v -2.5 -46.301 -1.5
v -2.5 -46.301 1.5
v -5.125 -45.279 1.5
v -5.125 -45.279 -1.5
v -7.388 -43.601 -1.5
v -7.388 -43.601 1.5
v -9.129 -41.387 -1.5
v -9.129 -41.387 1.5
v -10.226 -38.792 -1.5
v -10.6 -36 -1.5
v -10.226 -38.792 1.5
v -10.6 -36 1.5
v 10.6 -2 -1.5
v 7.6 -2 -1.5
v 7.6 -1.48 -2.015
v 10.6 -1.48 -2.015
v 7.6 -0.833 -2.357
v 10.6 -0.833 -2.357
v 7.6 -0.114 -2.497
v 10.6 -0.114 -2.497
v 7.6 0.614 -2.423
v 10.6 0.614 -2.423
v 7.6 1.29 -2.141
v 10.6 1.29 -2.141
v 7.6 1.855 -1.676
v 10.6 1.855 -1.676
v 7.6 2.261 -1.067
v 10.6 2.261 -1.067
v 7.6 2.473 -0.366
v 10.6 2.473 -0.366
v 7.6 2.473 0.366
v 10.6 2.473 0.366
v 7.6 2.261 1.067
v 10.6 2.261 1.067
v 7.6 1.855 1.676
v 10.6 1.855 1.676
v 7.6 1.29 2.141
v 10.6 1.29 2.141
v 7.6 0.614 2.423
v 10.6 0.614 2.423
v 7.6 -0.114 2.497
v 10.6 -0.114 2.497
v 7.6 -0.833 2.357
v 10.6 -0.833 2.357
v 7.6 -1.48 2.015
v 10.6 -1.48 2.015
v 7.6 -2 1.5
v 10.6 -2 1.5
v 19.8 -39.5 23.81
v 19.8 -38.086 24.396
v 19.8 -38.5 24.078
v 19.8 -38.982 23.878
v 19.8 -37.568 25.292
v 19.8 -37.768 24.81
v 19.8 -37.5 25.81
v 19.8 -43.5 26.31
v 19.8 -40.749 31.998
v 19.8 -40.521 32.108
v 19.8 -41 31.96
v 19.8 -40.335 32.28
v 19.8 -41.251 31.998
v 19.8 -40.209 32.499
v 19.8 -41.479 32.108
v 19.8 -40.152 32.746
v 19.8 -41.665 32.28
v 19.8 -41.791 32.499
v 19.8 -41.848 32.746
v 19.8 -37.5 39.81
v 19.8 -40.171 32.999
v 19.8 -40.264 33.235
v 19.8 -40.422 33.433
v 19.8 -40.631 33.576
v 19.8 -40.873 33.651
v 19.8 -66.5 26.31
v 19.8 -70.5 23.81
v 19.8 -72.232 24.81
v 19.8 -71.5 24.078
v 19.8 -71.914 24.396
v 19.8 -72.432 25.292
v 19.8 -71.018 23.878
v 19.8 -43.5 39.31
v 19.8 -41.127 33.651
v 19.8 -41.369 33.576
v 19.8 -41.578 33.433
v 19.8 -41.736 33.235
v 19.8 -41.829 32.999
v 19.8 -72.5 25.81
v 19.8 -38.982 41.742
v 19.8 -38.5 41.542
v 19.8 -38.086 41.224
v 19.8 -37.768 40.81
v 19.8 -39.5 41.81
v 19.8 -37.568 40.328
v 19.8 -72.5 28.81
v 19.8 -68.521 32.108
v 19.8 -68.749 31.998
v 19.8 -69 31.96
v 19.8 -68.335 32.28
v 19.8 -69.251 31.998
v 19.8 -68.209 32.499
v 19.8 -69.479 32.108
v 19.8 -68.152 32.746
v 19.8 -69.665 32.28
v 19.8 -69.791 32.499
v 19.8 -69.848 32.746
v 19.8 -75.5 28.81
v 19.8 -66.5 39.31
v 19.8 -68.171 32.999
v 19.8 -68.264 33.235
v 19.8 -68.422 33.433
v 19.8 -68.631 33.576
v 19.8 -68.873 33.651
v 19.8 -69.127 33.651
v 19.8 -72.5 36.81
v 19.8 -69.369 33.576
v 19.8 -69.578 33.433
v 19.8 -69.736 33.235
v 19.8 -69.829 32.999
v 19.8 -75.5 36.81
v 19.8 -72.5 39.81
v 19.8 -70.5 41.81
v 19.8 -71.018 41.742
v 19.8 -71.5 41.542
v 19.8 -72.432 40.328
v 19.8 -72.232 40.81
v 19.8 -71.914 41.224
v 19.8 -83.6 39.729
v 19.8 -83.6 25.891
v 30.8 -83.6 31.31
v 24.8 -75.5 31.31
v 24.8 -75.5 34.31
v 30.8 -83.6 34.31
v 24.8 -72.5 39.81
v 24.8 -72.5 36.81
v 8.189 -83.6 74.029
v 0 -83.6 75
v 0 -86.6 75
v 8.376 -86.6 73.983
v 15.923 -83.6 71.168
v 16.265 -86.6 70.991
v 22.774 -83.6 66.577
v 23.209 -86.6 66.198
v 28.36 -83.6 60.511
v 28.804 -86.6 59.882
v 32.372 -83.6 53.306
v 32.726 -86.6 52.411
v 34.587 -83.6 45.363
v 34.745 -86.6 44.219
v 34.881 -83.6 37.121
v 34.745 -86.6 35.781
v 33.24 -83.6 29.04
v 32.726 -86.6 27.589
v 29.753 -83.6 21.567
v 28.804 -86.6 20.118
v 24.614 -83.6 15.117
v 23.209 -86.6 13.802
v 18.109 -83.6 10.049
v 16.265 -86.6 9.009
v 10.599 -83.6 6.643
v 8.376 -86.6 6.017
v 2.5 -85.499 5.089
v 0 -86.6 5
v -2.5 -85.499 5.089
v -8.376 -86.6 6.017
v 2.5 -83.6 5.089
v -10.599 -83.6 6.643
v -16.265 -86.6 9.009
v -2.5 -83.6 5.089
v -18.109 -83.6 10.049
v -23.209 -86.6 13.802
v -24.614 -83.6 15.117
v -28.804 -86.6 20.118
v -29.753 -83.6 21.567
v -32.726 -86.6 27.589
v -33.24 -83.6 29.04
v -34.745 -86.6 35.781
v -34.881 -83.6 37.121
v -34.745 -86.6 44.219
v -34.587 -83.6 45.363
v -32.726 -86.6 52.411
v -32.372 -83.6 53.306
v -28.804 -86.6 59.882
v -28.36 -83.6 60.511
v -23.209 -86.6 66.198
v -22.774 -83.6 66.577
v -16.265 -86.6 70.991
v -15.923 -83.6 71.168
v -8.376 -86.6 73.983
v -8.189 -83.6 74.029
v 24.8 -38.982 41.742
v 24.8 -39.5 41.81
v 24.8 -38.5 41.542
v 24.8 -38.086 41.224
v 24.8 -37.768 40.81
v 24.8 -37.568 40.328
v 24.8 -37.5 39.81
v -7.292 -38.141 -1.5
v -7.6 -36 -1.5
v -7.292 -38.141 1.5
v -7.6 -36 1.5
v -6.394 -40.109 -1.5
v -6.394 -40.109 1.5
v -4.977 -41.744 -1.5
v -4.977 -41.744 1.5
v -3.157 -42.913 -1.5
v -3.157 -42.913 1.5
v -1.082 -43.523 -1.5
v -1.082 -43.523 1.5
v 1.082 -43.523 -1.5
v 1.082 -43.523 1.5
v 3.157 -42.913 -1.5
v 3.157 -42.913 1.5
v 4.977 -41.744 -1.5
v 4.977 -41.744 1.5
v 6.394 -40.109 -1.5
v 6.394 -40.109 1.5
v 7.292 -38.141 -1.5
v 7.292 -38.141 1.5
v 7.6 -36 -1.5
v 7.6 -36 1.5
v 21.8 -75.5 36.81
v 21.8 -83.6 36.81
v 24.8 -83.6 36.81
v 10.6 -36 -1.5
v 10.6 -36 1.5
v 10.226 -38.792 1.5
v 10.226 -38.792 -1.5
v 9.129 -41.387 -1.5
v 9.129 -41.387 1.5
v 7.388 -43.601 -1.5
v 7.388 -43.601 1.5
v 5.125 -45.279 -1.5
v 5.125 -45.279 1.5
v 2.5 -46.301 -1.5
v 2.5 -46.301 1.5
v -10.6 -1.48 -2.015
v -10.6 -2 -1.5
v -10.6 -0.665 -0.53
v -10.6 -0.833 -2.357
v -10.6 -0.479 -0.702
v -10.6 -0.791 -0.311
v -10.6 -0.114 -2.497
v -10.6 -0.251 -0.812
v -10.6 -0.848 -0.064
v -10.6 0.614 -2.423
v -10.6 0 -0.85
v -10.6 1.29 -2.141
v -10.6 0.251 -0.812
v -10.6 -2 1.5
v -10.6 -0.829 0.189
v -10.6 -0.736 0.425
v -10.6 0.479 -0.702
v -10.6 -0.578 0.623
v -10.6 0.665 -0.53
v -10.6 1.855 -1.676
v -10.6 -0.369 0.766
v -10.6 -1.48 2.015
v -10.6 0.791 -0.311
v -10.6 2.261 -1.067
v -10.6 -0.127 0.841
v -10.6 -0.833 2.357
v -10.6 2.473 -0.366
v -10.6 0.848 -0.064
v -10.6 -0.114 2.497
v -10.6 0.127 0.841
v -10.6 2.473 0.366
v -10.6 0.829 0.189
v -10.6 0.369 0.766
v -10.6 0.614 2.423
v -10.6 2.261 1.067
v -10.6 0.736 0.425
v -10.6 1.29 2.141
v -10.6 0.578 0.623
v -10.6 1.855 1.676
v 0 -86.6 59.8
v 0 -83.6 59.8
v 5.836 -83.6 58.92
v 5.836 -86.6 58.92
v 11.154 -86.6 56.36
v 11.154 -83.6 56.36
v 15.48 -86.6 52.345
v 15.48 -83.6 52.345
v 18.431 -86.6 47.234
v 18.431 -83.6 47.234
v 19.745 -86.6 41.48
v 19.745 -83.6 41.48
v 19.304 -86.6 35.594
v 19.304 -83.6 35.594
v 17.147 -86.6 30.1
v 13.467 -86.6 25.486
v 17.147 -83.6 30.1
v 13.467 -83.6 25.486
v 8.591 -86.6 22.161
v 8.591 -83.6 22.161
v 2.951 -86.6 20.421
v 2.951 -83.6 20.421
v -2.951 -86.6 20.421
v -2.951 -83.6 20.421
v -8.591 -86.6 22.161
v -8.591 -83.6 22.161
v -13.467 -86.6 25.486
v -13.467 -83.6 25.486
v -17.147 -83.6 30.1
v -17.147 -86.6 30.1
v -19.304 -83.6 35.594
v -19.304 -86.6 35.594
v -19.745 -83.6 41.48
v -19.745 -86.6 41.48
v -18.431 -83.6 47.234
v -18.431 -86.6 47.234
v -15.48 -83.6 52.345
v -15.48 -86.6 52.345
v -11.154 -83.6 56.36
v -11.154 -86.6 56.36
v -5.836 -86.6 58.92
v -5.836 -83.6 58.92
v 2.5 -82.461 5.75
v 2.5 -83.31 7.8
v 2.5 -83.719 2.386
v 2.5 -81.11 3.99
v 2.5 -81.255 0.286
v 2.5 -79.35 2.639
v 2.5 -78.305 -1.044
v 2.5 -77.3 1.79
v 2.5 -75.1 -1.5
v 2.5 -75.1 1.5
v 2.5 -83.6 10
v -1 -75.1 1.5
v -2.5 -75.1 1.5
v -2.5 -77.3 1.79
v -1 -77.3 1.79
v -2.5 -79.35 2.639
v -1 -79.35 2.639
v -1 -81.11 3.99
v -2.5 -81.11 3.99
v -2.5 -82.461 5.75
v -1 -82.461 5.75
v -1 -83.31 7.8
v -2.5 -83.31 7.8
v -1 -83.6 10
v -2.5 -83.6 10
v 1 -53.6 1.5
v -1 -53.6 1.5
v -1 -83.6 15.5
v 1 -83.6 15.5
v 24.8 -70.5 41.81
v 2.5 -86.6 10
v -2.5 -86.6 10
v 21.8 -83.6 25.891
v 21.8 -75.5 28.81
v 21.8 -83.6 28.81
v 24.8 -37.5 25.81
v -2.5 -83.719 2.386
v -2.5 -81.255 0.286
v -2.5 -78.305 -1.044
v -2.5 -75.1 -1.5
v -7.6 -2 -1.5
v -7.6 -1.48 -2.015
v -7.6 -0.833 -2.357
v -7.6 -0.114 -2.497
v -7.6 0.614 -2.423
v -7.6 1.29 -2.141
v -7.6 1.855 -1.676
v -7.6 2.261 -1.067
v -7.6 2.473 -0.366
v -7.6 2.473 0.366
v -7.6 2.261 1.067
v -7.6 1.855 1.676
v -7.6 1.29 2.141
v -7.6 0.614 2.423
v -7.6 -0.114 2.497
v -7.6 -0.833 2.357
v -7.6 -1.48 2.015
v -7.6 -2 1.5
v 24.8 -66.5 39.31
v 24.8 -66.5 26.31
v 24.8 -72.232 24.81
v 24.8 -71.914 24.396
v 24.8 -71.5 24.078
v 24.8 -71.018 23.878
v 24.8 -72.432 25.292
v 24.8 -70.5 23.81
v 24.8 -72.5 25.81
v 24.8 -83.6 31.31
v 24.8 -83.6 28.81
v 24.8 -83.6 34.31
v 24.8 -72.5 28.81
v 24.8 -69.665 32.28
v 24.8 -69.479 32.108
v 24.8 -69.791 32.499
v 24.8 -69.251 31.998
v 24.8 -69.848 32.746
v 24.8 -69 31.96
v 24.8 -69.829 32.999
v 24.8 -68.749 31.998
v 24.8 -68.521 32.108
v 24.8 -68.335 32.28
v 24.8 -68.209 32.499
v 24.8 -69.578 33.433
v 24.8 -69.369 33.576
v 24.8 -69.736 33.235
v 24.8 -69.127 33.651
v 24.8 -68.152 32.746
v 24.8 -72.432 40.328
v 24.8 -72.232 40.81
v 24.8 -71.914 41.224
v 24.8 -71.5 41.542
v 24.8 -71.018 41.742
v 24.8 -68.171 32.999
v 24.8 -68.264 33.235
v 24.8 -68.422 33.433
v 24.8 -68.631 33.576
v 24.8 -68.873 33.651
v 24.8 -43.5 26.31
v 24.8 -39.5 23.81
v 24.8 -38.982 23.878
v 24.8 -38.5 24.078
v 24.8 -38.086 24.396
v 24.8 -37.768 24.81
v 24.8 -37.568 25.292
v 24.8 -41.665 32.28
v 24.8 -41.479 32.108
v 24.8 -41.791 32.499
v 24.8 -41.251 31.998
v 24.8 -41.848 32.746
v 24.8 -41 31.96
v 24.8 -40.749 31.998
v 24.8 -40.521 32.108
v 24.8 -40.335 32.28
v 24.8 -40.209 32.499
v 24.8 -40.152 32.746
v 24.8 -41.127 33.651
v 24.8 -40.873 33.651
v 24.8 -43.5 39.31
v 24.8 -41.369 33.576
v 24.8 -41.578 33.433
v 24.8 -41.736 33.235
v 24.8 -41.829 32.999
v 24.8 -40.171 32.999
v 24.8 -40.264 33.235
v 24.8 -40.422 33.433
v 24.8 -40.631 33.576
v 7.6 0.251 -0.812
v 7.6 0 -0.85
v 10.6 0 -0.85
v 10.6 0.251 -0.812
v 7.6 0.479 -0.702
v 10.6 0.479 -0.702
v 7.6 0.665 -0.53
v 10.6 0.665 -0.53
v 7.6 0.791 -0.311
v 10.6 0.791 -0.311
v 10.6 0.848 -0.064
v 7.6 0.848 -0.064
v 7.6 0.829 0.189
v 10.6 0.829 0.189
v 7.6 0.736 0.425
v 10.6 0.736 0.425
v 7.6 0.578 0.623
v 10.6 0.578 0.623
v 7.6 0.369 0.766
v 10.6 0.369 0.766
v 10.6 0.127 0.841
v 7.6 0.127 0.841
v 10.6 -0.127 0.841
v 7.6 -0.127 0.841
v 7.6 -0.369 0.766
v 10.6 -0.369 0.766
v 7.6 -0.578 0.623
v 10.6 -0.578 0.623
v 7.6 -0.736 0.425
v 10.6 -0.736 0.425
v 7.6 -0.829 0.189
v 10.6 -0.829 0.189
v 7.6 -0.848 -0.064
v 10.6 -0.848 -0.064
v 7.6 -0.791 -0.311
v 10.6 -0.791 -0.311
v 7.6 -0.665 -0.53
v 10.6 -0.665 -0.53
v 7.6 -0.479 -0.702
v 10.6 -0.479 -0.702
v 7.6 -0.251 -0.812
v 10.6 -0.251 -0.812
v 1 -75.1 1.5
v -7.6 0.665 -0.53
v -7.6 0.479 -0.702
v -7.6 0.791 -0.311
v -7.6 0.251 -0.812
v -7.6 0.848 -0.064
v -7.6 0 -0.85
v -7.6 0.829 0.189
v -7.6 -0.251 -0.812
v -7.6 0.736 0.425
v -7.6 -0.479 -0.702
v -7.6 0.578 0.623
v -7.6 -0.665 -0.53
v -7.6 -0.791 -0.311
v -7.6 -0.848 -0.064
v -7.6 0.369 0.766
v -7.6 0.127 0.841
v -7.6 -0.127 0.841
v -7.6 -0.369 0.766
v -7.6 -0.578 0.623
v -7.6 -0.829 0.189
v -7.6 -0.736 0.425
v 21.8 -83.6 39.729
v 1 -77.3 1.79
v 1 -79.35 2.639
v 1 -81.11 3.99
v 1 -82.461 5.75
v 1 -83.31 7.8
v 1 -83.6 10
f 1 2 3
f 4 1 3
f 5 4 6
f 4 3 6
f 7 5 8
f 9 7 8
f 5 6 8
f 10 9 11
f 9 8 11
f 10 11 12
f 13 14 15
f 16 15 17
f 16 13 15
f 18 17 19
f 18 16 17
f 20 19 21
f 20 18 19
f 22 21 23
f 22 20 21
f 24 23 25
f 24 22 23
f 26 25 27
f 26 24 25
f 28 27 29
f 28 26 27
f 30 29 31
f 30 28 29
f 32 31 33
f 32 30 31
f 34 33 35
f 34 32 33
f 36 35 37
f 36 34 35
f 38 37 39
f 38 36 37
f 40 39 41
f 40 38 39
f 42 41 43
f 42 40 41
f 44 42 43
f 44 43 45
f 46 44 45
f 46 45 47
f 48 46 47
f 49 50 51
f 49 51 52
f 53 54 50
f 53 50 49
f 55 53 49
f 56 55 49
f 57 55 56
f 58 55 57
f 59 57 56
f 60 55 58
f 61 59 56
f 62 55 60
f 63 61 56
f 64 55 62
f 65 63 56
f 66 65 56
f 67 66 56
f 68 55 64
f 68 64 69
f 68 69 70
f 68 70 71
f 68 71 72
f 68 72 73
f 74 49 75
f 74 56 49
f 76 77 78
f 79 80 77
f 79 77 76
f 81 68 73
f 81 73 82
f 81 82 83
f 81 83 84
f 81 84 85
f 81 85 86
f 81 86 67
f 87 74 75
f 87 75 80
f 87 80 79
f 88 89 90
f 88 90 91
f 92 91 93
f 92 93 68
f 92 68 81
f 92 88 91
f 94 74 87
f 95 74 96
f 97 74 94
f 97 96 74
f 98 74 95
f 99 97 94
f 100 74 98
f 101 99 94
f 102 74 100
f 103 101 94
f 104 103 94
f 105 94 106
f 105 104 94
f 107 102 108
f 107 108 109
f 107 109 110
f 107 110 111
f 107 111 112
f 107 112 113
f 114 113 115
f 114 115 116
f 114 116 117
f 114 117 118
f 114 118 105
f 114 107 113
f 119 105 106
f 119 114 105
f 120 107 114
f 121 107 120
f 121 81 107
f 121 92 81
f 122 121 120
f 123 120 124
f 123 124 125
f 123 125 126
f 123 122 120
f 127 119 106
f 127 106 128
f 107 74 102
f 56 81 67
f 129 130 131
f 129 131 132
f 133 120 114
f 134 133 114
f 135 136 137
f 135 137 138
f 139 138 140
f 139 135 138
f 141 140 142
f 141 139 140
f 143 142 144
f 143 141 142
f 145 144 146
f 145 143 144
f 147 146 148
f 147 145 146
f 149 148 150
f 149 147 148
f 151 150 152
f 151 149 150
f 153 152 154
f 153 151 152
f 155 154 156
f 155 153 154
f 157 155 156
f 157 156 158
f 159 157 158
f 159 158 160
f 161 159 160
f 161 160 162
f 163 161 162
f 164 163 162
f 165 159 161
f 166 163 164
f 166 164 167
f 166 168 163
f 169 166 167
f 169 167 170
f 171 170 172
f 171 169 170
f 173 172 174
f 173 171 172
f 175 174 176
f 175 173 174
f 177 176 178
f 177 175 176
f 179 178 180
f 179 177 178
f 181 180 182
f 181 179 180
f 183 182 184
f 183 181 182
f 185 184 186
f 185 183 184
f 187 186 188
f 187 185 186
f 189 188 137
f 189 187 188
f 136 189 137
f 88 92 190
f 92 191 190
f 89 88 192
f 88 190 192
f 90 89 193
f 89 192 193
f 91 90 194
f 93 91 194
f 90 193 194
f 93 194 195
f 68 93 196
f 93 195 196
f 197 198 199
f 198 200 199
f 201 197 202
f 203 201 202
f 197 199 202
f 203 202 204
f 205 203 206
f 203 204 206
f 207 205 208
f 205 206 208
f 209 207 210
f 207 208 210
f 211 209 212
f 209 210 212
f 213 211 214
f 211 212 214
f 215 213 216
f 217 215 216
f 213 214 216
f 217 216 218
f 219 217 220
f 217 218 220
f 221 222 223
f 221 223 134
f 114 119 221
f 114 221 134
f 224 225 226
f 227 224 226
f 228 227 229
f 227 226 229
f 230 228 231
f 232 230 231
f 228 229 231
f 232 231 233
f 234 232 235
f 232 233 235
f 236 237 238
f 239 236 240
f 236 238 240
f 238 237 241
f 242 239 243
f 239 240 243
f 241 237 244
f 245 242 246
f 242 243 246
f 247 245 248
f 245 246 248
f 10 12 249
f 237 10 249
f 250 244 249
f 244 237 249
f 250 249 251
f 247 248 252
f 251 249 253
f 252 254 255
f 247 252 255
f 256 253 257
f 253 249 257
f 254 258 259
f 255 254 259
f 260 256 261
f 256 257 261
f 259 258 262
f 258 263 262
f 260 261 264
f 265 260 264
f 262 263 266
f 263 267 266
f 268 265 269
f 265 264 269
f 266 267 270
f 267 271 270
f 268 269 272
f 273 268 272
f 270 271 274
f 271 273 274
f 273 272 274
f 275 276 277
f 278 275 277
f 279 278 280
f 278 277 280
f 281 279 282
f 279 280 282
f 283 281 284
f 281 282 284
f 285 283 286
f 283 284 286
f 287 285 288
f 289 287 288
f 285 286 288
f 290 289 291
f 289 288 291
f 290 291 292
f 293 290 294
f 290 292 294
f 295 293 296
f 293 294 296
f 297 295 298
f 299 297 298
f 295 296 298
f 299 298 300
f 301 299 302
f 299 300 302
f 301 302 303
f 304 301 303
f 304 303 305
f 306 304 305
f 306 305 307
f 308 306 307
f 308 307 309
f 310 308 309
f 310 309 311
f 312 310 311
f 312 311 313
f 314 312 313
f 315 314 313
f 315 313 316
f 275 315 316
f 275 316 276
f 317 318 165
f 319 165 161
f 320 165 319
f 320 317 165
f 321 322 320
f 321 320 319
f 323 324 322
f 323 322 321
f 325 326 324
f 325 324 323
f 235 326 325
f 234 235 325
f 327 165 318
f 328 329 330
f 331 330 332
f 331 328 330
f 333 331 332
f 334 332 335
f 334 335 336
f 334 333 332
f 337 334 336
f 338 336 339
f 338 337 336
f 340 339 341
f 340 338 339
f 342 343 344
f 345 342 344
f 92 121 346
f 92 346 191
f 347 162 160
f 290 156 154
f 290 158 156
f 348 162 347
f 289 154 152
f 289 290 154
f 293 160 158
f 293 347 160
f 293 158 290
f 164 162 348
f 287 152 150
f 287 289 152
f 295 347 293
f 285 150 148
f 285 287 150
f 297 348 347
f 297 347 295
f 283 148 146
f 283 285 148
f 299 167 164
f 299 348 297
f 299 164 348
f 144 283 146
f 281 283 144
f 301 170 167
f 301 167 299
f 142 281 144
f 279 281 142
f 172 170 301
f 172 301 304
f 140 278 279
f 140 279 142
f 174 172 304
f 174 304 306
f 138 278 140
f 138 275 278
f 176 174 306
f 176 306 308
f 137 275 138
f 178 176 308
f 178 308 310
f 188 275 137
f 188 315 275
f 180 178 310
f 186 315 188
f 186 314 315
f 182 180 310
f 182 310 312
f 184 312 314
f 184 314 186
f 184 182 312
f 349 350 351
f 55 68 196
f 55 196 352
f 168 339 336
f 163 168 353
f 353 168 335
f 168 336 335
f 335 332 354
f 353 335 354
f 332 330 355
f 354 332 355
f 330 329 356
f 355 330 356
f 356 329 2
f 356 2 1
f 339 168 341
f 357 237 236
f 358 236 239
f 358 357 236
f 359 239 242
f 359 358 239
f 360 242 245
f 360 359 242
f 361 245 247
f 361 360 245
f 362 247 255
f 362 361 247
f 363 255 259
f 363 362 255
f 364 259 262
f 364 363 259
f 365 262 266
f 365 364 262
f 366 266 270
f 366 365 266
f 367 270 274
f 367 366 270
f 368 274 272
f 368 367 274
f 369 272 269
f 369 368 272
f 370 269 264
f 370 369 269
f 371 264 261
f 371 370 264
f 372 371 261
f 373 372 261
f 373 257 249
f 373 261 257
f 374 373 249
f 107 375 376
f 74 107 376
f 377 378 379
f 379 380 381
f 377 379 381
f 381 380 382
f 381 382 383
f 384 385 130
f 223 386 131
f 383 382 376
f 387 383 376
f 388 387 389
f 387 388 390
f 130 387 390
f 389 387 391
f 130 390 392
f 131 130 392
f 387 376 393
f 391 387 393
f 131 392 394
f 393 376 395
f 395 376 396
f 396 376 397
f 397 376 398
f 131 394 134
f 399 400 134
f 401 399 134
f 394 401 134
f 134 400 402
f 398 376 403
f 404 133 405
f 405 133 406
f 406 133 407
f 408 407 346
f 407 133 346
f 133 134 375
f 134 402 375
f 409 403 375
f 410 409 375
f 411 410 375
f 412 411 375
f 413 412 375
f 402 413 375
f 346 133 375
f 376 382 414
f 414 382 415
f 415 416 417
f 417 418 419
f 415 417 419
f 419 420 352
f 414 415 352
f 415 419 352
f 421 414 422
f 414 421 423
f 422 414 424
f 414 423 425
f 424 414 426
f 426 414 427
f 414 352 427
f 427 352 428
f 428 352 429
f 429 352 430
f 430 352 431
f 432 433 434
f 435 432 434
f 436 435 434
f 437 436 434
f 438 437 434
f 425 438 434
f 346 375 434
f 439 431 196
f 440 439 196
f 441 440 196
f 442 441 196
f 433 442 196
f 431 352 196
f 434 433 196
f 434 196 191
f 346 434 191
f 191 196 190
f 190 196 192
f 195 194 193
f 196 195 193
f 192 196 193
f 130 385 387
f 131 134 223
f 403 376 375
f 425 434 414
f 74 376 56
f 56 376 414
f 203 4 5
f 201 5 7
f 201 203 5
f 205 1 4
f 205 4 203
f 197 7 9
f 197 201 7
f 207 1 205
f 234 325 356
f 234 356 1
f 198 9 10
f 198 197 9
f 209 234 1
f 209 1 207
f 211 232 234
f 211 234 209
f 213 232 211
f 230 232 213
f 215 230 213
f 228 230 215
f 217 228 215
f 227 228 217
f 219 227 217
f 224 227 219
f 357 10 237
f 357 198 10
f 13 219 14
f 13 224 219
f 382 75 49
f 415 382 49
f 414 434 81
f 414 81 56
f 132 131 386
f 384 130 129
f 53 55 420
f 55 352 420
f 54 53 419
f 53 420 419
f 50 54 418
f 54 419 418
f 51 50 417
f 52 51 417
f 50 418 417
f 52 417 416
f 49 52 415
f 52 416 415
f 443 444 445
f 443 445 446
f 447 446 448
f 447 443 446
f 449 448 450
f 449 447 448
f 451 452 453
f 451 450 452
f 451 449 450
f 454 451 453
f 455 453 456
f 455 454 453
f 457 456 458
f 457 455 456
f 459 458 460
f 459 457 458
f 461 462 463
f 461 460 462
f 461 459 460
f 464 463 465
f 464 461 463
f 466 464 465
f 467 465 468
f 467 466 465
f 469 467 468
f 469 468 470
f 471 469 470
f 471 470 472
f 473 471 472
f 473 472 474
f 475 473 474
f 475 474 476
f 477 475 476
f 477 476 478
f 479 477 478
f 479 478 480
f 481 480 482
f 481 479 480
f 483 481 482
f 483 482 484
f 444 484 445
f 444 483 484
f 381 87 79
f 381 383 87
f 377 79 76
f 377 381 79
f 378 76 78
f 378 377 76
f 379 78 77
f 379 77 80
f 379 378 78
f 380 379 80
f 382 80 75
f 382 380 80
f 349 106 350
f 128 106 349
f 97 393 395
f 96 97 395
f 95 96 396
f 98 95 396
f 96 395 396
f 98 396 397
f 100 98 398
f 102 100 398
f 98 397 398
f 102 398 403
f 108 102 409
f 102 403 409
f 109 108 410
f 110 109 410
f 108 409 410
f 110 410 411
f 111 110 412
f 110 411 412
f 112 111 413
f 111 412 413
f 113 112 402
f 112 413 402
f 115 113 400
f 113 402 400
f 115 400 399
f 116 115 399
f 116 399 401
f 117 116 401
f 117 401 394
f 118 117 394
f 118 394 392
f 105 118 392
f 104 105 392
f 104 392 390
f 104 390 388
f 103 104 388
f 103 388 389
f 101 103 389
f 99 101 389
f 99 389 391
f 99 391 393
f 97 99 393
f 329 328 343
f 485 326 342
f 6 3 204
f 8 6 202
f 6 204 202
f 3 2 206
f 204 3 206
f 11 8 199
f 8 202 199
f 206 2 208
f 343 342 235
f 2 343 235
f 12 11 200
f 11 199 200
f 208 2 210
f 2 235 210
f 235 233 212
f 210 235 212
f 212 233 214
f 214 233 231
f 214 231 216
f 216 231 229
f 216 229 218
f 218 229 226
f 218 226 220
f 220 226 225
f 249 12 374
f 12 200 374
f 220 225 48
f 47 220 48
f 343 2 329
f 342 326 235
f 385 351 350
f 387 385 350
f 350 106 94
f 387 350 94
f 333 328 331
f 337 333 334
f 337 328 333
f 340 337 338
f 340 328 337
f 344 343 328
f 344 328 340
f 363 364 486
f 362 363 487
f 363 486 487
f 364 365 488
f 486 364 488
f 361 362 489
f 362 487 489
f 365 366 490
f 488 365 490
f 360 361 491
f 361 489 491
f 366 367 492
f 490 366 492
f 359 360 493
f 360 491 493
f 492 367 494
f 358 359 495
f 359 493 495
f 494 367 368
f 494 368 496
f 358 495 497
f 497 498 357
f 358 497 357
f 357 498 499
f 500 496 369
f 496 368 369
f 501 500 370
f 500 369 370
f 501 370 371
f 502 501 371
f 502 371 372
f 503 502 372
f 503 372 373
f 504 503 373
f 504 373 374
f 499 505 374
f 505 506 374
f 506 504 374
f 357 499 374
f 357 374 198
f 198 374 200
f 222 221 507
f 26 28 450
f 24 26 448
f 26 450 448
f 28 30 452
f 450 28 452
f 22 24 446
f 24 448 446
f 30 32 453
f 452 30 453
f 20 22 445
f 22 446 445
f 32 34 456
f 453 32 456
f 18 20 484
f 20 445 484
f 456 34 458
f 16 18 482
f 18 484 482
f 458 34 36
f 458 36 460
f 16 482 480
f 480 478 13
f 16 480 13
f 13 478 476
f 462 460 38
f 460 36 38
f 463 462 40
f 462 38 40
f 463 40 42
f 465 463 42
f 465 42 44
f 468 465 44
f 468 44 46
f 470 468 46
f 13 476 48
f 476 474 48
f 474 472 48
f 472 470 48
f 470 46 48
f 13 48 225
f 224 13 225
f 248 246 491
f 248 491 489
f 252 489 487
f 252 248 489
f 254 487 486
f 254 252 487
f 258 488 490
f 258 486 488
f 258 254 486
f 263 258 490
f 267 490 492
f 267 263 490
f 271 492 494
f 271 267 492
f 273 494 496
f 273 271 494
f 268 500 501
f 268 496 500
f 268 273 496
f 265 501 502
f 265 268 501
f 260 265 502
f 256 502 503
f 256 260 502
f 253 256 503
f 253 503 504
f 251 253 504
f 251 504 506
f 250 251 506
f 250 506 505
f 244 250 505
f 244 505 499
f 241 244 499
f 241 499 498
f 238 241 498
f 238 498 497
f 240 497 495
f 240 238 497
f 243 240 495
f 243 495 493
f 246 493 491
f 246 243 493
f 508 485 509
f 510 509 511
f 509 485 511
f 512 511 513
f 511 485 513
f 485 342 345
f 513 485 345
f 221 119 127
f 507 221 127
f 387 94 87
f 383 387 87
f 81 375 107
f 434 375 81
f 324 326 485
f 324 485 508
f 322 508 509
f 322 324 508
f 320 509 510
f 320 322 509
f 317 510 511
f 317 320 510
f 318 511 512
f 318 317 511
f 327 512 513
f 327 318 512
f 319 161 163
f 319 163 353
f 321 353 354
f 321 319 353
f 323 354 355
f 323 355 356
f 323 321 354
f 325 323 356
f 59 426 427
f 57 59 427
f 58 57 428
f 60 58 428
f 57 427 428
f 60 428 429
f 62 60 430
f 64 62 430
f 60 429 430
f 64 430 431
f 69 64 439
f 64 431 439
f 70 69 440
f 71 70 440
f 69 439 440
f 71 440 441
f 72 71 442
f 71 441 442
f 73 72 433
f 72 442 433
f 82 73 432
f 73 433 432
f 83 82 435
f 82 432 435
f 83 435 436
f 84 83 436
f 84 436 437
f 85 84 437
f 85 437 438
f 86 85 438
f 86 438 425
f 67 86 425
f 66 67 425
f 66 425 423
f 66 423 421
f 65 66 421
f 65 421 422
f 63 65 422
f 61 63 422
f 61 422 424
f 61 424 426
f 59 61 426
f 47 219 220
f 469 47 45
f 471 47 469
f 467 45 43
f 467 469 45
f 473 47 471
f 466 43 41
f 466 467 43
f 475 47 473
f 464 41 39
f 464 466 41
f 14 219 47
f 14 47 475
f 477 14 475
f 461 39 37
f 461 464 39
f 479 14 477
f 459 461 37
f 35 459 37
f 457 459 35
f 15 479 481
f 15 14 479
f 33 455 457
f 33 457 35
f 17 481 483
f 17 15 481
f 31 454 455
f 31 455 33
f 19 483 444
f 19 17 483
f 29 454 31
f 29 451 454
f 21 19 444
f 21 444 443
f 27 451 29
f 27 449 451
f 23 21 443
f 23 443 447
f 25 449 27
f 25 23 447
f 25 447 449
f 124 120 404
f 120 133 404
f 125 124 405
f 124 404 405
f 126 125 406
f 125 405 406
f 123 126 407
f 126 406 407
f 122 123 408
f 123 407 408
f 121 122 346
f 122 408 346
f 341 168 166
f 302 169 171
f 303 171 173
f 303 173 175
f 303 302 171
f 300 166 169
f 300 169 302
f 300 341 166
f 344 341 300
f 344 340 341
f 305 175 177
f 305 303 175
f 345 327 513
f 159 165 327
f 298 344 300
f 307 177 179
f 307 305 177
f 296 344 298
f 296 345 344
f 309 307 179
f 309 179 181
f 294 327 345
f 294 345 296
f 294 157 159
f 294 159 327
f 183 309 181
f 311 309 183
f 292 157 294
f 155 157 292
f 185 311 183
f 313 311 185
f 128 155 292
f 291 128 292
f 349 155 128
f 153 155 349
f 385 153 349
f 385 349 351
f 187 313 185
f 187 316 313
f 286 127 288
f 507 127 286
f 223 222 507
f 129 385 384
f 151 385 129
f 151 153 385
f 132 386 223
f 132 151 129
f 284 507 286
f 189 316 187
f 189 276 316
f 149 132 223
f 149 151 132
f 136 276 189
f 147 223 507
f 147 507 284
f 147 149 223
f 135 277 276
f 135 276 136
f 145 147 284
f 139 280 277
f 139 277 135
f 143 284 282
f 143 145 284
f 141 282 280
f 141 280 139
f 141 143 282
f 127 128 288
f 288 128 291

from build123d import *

# Parameters (mm, degrees)
ESBO_O1_R                  = 2.5
RESSALTO_EXTRUS_O1_DEPTH   = 10.6
ESBO_O8_W                  = 21.2
ESBO_O8_H                  = 35
RESSALTO_EXTRUS_O6_DEPTH   = 1.5
RESSALTO_EXTRUS_O2_DEPTH   = 1.5
CORTE_EXTRUS_O1_DEPTH      = 48.855720661
CORTE_EXTRUS_O1_DEPTH_BACK = 48.855720661
ESBO_O3_W                  = 15.2
ESBO_O3_H                  = 37.5
CORTE_EXTRUS_O2_DEPTH      = 48.855720661
CORTE_EXTRUS_O2_DEPTH_BACK = 48.855720661
ESBO_O4_R                  = 0.85
ESBO_O5_W                  = 3
ESBO_O5_H                  = 30
RESSALTO_EXTRUS_O3_DEPTH   = 2.5
RESSALTO_EXTRUS_O4_DEPTH   = 2.5
RESSALTO_EXTRUS_O5_START   = -83.6
ESBO_O7_R                  = 35
RESSALTO_EXTRUS_O5_DEPTH   = 3
NERVURA2_REACH             = 121.79
ESBO_O10_WALL_W            = 274.68518898
ESBO_O10_WALL_H            = 2
ESBO_O11_W                 = 18
ESBO_O11_H                 = 35
RESSALTO_EXTRUS_O7_DEPTH   = 5
ESBO_O12_W                 = 13
ESBO_O12_H                 = 23
CORTE_EXTRUS_O3_DEPTH      = 130.230801453
ESBO_O13_R                 = 0.85
CORTE_EXTRUS_O4_DEPTH      = 130.230801453
ESBO_O14_W                 = 8
ESBO_O14_H                 = 14.1
RESSALTO_EXTRUS_O8_DEPTH   = 5
FILETE1_R                  = 2
NERVURA3_REACH             = 128.994
ESBO_O15_WALL_W            = 11.798728746
ESBO_O15_WALL_H            = 2
ESBO_O16_R                 = 19.8
CORTE_EXTRUS_O5_DEPTH      = 120.428681739
NERVURA4_REACH             = 104.492
ESBO_O17_WALL_W            = 217.06365237
ESBO_O17_WALL_H            = 3


with BuildPart() as part:
    # Esboço1 → Ressalto-extrusão1 (new, symmetric)
    with BuildSketch(Plane(origin=(0, 0, 0), x_dir=(0, 0, -1), z_dir=(1, 0, 0))):
        Circle(ESBO_O1_R)
    extrude(amount=RESSALTO_EXTRUS_O1_DEPTH, both=True)

    # Esboço8 → Ressalto-extrusão6 (add, symmetric)
    with BuildSketch(Plane.XY):
        with Locations((0, -17.5)):
            Rectangle(ESBO_O8_W, ESBO_O8_H)
    extrude(amount=RESSALTO_EXTRUS_O6_DEPTH, both=True)

    # Esboço2 → Ressalto-extrusão2 (add, symmetric)
    with BuildSketch(Plane.XY):
        with BuildLine():
            Line((-10.6, -36), (-10.6, -35))
            Line((-10.6, -35), (-7.6, -35))
            Line((-7.6, -35), (-7.6, -36))
            ThreePointArc((-7.6, -36), (0, -43.6), (7.6, -36))
            Line((7.6, -36), (7.6, -35))
            Line((7.6, -35), (10.6, -35))
            Line((10.6, -35), (10.6, -36))
            ThreePointArc((10.6, -36), (0, -46.6), (-10.6, -36))
        make_face()
    extrude(amount=RESSALTO_EXTRUS_O2_DEPTH, both=True)

    # Esboço3 → Corte-extrusão1 (cut, two sides: drawn at the far end of the back side and taken through both)
    with BuildSketch(Plane.XY.offset(-CORTE_EXTRUS_O1_DEPTH_BACK)):
        with Locations((0, -16.25)):
            Rectangle(ESBO_O3_W, ESBO_O3_H)
    extrude(amount=CORTE_EXTRUS_O1_DEPTH + CORTE_EXTRUS_O1_DEPTH_BACK, mode=Mode.SUBTRACT)

    # Esboço4 → Corte-extrusão2 (cut, two sides: drawn at the far end of the back side and taken through both)
    with BuildSketch(Plane(origin=(0, 0, 0), x_dir=(0, 0, -1), z_dir=(1, 0, 0)).offset(-CORTE_EXTRUS_O2_DEPTH_BACK)):
        Circle(ESBO_O4_R)
    extrude(amount=CORTE_EXTRUS_O2_DEPTH + CORTE_EXTRUS_O2_DEPTH_BACK, mode=Mode.SUBTRACT)

    # Esboço5 → Ressalto-extrusão3 (add, symmetric)
    with BuildSketch(Plane(origin=(0, 0, 0), x_dir=(0, 0, -1), z_dir=(1, 0, 0))):
        with Locations((0, -60.1)):
            Rectangle(ESBO_O5_W, ESBO_O5_H)
    extrude(amount=RESSALTO_EXTRUS_O3_DEPTH, both=True)

    # Esboço6 → Ressalto-extrusão4 (add, symmetric)
    with BuildSketch(Plane(origin=(0, 0, 0), x_dir=(0, 0, -1), z_dir=(1, 0, 0))):
        with BuildLine():
            ThreePointArc((-10, -86.6), (-1.868272016, -83.231727984), (1.5, -75.1))
            ThreePointArc((1.5, -75.1), (0, -73.6), (-1.5, -75.1))
            ThreePointArc((-1.5, -75.1), (-3.98959236, -81.11040764), (-10, -83.6))
            ThreePointArc((-10, -83.6), (-11.5, -85.1), (-10, -86.6))
        make_face()
    extrude(amount=RESSALTO_EXTRUS_O4_DEPTH, both=True)

    # Esboço7 → Ressalto-extrusão5 (add)
    with BuildSketch(Plane(origin=(0, 0, 0), x_dir=(1, 0, 0), z_dir=(0, 1, 0)).offset(RESSALTO_EXTRUS_O5_START)):
        with Locations(Location((0, -40, 0), (0, 0, 270))):
            Circle(ESBO_O7_R)
    extrude(amount=-RESSALTO_EXTRUS_O5_DEPTH)

    # Esboço10 wall → Nervura2 (add, up to next)
    with BuildSketch(Plane(origin=(0, -68.6, 8.5), x_dir=(0, -0.906183139995, 0.422885465331), z_dir=(0, -0.422885465331, -0.906183139995)), mode=Mode.PRIVATE) as nervura2_sk1:
        Rectangle(ESBO_O10_WALL_W, ESBO_O10_WALL_H)
    nervura2_tool1 = extrude(nervura2_sk1.sketch, amount=NERVURA2_REACH, mode=Mode.PRIVATE) - part.part
    add(nervura2_tool1.solids().sort_by_distance((0, -68.6, 8.5))[0])



with BuildPart() as body_2:
    # Esboço11 → Ressalto-extrusão7 (new body)
    with BuildSketch(Plane(origin=(19.8, 0, 0), x_dir=(0, 0, -1), z_dir=(1, 0, 0))):
        with Locations((-32.81, -55)):
            Rectangle(ESBO_O11_W, ESBO_O11_H)
    extrude(amount=RESSALTO_EXTRUS_O7_DEPTH)

    # Esboço12 → Corte-extrusão3 (cut, through all)
    with BuildSketch(Plane(origin=(24.8, 0, 0), x_dir=(0, 0, -1), z_dir=(1, 0, 0))):
        with Locations((-32.81, -55)):
            Rectangle(ESBO_O12_W, ESBO_O12_H)
    extrude(amount=-CORTE_EXTRUS_O3_DEPTH, mode=Mode.SUBTRACT)

    # Esboço13 → Corte-extrusão4 (cut, through all)
    with BuildSketch(Plane(origin=(24.8, 0, 0), x_dir=(0, 0, -1), z_dir=(1, 0, 0))):
        with Locations((-32.81, -41)):
            Circle(ESBO_O13_R)
        with Locations((-32.81, -69)):
            Circle(ESBO_O13_R)
    extrude(amount=-CORTE_EXTRUS_O4_DEPTH, mode=Mode.SUBTRACT)


with BuildPart() as part_1:
    add(part.part)

    add(body_2.part)  # Ressalto-extrusão8 merges body 2
    # Esboço14 → Ressalto-extrusão8 (add)
    with BuildSketch(Plane.ZY.offset(-19.8)):
        with Locations((32.81, -79.55)):
            Rectangle(ESBO_O14_W, ESBO_O14_H)
    extrude(amount=-RESSALTO_EXTRUS_O8_DEPTH)

    # Filete1
    filete1_edges = [part_1.edges().sort_by_distance(p)[0] for p in [
        (22.3, -37.5, 41.81),
        (22.3, -72.5, 41.81),
        (22.3, -72.5, 23.81),
        (22.3, -37.5, 23.81),
    ]]
    fillet(filete1_edges, radius=FILETE1_R)

    # Esboço15 wall → Nervura3 (add, up to next)
    with BuildSketch(Plane(origin=(19.8, -81.05, 26.81), x_dir=(0, -0.94077931952, -0.339019574602), z_dir=(0, 0.339019574602, -0.94077931952)), mode=Mode.PRIVATE) as nervura3_sk1:
        with Locations((0, -1)):
            Rectangle(ESBO_O15_WALL_W, ESBO_O15_WALL_H)
    nervura3_tool1 = extrude(nervura3_sk1.sketch, amount=-NERVURA3_REACH, mode=Mode.PRIVATE) - part_1.part
    nervura3 = nervura3_tool1.solids().sort_by_distance((19.8, -81.05, 26.81))[0]
    add(nervura3)

    # Espelhar2: Nervura3 across plane
    add(nervura3.mirror(Plane.XY.offset(32.81)))

    # Esboço16 → Corte-extrusão5 (cut, through all)
    with BuildSketch(Plane(origin=(0, -83.6, 0), x_dir=(1, 0, 0), z_dir=(0, 1, 0))):
        with Locations(Location((0, -40, 0), (0, 0, 270))):
            Circle(ESBO_O16_R)
    extrude(amount=-CORTE_EXTRUS_O5_DEPTH, mode=Mode.SUBTRACT)

    # Esboço17 wall → Nervura4 (add, up to next)
    with BuildSketch(Plane(origin=(27.8, -79.55, 32.81), x_dir=(0.595227550626, -0.803557193345, 0), z_dir=(0.803557193345, 0.595227550626, 0)), mode=Mode.PRIVATE) as nervura4_sk1:
        Rectangle(ESBO_O17_WALL_W, ESBO_O17_WALL_H)
    nervura4_tool1 = extrude(nervura4_sk1.sketch, amount=-NERVURA4_REACH, mode=Mode.PRIVATE) - part_1.part
    add(nervura4_tool1.solids().sort_by_distance((27.8, -79.55, 32.81))[0])


solid = part_1.part
